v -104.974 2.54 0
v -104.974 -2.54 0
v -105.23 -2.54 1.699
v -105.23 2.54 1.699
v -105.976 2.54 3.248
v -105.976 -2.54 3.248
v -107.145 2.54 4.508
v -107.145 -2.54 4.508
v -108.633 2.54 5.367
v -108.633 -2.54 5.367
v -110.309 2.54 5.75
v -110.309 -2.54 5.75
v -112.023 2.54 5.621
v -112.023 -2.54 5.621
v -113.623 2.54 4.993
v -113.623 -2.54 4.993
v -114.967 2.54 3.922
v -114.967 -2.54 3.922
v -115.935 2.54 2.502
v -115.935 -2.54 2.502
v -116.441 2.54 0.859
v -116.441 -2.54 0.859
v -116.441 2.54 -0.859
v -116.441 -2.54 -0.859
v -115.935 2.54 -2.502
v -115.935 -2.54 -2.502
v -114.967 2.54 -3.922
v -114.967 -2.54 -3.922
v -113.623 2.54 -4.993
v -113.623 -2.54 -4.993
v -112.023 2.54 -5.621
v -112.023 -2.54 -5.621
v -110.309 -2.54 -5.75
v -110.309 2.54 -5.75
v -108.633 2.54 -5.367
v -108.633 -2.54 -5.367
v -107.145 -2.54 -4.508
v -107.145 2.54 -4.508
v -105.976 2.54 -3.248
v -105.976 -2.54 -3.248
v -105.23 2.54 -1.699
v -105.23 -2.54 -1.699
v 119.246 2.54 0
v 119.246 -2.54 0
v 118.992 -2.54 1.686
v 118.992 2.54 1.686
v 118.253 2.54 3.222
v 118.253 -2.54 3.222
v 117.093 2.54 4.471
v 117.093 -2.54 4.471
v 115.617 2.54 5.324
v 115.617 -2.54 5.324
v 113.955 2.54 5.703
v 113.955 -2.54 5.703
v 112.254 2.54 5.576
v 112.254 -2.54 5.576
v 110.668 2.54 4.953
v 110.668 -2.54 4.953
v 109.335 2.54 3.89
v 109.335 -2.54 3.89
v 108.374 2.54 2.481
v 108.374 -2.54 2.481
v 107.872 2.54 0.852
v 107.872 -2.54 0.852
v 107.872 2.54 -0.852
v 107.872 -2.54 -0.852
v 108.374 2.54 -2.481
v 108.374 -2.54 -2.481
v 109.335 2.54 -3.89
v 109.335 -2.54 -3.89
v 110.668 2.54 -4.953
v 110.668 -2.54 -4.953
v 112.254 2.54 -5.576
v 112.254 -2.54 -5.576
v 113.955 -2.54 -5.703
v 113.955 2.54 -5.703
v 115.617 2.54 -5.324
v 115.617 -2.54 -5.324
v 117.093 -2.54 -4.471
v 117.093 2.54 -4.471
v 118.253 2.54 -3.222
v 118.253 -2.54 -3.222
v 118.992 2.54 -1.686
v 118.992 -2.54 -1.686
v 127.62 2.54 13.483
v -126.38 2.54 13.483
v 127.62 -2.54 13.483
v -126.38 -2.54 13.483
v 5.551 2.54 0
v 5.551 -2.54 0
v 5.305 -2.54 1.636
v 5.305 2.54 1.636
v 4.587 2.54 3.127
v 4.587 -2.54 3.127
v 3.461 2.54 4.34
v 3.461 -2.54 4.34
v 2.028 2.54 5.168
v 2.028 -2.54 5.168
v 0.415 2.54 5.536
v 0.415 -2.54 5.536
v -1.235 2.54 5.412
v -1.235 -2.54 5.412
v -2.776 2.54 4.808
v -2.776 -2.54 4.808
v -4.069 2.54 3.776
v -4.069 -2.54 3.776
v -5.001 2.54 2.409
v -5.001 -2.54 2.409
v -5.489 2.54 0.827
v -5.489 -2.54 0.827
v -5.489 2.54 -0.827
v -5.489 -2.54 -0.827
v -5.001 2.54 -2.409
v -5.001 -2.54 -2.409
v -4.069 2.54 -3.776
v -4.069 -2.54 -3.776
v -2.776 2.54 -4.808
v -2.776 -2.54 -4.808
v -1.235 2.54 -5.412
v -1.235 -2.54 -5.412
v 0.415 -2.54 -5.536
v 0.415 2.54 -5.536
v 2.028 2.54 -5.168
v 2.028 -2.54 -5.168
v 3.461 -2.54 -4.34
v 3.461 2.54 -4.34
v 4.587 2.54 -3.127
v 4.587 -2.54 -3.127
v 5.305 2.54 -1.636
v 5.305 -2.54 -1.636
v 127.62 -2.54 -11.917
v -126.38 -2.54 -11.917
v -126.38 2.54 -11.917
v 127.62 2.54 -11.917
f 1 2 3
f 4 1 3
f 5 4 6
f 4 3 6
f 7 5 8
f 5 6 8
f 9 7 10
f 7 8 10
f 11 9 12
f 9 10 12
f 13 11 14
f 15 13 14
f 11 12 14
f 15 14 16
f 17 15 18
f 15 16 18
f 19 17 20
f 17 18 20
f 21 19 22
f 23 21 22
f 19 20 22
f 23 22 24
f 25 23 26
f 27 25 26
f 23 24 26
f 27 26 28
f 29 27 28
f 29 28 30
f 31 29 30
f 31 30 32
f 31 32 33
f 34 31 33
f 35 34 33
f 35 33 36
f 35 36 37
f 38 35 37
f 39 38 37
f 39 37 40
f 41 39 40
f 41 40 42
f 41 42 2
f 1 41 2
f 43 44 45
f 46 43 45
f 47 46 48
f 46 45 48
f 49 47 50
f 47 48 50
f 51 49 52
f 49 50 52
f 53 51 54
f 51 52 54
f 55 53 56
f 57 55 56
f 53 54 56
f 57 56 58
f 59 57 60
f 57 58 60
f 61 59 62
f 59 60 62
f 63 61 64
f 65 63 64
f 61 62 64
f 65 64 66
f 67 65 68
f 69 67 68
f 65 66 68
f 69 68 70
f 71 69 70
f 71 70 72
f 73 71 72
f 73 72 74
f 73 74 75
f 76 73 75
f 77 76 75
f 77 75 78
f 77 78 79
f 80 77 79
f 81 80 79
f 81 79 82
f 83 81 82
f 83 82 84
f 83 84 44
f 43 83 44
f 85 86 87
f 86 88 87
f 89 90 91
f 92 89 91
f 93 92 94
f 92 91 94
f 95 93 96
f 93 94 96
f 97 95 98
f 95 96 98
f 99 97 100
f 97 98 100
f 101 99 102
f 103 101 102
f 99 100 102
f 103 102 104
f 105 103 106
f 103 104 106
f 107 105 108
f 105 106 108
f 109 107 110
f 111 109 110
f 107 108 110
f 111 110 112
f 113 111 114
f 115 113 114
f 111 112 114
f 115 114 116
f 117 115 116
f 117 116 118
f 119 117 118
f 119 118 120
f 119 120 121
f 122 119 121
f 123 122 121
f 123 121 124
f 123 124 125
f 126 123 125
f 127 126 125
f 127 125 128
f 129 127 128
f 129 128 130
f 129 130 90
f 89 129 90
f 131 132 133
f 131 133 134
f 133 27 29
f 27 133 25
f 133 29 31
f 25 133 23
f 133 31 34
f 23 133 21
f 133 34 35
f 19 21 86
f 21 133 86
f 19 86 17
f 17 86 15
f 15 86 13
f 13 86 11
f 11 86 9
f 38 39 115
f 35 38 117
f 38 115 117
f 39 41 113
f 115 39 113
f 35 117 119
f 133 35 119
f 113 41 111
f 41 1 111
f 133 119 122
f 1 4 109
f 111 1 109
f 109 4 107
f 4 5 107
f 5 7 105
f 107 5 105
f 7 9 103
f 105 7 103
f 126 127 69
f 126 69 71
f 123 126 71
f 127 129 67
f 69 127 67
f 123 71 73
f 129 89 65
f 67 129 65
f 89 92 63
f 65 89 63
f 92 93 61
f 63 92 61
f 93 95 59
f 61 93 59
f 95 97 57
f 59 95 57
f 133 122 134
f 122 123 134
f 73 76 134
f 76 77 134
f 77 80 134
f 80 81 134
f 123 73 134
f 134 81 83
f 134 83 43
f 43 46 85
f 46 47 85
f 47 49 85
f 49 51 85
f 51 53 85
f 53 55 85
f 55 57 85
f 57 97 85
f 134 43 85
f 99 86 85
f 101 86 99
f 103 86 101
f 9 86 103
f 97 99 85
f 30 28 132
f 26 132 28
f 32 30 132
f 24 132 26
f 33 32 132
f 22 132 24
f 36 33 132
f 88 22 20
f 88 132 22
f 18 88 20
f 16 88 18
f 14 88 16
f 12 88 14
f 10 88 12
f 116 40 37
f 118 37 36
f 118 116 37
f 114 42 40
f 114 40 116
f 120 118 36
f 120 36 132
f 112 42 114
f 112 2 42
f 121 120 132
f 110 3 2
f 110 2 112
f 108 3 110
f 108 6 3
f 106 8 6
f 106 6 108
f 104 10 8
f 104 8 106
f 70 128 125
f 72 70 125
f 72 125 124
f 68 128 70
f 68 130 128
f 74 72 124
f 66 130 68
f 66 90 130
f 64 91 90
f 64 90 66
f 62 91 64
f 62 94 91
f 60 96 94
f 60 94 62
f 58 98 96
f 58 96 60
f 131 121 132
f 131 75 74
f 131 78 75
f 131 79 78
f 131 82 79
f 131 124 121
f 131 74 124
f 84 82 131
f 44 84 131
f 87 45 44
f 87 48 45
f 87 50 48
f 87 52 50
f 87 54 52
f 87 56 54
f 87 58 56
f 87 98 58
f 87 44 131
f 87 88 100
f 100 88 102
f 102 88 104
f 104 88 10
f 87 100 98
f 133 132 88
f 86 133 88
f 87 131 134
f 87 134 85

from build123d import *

# Parameters (mm, degrees)
F0_W     = 254
F0_H     = 25.4
F1_DEPTH = 2.54
F2_R     = 5.765709
F2_R_2   = 5.719151
F3_DEPTH = 38.1
F4_R     = 5.551244
F5_DEPTH = 25.4


with BuildPart() as f1:
    # F0 (on Front) → F1 (new body, symmetric)
    with BuildSketch(Plane.XZ):
        with Locations((0.620032, 0.783191)):
            Rectangle(F0_W, F0_H)
    extrude(amount=F1_DEPTH, both=True)

    # F2 (on face) → F3 (cut)
    with BuildSketch(Plane.XZ.offset(2.54)):
        with Locations((-110.739939, 0)):
            Circle(F2_R)
        with Locations((113.527127, 0)):
            Circle(F2_R_2)
    extrude(amount=-F3_DEPTH, mode=Mode.SUBTRACT)

    # F4 (on face) → F5 (cut)
    with BuildSketch(Plane.XZ.offset(2.54)):
        Circle(F4_R)
    extrude(amount=-F5_DEPTH, mode=Mode.SUBTRACT)


solid = f1.part
